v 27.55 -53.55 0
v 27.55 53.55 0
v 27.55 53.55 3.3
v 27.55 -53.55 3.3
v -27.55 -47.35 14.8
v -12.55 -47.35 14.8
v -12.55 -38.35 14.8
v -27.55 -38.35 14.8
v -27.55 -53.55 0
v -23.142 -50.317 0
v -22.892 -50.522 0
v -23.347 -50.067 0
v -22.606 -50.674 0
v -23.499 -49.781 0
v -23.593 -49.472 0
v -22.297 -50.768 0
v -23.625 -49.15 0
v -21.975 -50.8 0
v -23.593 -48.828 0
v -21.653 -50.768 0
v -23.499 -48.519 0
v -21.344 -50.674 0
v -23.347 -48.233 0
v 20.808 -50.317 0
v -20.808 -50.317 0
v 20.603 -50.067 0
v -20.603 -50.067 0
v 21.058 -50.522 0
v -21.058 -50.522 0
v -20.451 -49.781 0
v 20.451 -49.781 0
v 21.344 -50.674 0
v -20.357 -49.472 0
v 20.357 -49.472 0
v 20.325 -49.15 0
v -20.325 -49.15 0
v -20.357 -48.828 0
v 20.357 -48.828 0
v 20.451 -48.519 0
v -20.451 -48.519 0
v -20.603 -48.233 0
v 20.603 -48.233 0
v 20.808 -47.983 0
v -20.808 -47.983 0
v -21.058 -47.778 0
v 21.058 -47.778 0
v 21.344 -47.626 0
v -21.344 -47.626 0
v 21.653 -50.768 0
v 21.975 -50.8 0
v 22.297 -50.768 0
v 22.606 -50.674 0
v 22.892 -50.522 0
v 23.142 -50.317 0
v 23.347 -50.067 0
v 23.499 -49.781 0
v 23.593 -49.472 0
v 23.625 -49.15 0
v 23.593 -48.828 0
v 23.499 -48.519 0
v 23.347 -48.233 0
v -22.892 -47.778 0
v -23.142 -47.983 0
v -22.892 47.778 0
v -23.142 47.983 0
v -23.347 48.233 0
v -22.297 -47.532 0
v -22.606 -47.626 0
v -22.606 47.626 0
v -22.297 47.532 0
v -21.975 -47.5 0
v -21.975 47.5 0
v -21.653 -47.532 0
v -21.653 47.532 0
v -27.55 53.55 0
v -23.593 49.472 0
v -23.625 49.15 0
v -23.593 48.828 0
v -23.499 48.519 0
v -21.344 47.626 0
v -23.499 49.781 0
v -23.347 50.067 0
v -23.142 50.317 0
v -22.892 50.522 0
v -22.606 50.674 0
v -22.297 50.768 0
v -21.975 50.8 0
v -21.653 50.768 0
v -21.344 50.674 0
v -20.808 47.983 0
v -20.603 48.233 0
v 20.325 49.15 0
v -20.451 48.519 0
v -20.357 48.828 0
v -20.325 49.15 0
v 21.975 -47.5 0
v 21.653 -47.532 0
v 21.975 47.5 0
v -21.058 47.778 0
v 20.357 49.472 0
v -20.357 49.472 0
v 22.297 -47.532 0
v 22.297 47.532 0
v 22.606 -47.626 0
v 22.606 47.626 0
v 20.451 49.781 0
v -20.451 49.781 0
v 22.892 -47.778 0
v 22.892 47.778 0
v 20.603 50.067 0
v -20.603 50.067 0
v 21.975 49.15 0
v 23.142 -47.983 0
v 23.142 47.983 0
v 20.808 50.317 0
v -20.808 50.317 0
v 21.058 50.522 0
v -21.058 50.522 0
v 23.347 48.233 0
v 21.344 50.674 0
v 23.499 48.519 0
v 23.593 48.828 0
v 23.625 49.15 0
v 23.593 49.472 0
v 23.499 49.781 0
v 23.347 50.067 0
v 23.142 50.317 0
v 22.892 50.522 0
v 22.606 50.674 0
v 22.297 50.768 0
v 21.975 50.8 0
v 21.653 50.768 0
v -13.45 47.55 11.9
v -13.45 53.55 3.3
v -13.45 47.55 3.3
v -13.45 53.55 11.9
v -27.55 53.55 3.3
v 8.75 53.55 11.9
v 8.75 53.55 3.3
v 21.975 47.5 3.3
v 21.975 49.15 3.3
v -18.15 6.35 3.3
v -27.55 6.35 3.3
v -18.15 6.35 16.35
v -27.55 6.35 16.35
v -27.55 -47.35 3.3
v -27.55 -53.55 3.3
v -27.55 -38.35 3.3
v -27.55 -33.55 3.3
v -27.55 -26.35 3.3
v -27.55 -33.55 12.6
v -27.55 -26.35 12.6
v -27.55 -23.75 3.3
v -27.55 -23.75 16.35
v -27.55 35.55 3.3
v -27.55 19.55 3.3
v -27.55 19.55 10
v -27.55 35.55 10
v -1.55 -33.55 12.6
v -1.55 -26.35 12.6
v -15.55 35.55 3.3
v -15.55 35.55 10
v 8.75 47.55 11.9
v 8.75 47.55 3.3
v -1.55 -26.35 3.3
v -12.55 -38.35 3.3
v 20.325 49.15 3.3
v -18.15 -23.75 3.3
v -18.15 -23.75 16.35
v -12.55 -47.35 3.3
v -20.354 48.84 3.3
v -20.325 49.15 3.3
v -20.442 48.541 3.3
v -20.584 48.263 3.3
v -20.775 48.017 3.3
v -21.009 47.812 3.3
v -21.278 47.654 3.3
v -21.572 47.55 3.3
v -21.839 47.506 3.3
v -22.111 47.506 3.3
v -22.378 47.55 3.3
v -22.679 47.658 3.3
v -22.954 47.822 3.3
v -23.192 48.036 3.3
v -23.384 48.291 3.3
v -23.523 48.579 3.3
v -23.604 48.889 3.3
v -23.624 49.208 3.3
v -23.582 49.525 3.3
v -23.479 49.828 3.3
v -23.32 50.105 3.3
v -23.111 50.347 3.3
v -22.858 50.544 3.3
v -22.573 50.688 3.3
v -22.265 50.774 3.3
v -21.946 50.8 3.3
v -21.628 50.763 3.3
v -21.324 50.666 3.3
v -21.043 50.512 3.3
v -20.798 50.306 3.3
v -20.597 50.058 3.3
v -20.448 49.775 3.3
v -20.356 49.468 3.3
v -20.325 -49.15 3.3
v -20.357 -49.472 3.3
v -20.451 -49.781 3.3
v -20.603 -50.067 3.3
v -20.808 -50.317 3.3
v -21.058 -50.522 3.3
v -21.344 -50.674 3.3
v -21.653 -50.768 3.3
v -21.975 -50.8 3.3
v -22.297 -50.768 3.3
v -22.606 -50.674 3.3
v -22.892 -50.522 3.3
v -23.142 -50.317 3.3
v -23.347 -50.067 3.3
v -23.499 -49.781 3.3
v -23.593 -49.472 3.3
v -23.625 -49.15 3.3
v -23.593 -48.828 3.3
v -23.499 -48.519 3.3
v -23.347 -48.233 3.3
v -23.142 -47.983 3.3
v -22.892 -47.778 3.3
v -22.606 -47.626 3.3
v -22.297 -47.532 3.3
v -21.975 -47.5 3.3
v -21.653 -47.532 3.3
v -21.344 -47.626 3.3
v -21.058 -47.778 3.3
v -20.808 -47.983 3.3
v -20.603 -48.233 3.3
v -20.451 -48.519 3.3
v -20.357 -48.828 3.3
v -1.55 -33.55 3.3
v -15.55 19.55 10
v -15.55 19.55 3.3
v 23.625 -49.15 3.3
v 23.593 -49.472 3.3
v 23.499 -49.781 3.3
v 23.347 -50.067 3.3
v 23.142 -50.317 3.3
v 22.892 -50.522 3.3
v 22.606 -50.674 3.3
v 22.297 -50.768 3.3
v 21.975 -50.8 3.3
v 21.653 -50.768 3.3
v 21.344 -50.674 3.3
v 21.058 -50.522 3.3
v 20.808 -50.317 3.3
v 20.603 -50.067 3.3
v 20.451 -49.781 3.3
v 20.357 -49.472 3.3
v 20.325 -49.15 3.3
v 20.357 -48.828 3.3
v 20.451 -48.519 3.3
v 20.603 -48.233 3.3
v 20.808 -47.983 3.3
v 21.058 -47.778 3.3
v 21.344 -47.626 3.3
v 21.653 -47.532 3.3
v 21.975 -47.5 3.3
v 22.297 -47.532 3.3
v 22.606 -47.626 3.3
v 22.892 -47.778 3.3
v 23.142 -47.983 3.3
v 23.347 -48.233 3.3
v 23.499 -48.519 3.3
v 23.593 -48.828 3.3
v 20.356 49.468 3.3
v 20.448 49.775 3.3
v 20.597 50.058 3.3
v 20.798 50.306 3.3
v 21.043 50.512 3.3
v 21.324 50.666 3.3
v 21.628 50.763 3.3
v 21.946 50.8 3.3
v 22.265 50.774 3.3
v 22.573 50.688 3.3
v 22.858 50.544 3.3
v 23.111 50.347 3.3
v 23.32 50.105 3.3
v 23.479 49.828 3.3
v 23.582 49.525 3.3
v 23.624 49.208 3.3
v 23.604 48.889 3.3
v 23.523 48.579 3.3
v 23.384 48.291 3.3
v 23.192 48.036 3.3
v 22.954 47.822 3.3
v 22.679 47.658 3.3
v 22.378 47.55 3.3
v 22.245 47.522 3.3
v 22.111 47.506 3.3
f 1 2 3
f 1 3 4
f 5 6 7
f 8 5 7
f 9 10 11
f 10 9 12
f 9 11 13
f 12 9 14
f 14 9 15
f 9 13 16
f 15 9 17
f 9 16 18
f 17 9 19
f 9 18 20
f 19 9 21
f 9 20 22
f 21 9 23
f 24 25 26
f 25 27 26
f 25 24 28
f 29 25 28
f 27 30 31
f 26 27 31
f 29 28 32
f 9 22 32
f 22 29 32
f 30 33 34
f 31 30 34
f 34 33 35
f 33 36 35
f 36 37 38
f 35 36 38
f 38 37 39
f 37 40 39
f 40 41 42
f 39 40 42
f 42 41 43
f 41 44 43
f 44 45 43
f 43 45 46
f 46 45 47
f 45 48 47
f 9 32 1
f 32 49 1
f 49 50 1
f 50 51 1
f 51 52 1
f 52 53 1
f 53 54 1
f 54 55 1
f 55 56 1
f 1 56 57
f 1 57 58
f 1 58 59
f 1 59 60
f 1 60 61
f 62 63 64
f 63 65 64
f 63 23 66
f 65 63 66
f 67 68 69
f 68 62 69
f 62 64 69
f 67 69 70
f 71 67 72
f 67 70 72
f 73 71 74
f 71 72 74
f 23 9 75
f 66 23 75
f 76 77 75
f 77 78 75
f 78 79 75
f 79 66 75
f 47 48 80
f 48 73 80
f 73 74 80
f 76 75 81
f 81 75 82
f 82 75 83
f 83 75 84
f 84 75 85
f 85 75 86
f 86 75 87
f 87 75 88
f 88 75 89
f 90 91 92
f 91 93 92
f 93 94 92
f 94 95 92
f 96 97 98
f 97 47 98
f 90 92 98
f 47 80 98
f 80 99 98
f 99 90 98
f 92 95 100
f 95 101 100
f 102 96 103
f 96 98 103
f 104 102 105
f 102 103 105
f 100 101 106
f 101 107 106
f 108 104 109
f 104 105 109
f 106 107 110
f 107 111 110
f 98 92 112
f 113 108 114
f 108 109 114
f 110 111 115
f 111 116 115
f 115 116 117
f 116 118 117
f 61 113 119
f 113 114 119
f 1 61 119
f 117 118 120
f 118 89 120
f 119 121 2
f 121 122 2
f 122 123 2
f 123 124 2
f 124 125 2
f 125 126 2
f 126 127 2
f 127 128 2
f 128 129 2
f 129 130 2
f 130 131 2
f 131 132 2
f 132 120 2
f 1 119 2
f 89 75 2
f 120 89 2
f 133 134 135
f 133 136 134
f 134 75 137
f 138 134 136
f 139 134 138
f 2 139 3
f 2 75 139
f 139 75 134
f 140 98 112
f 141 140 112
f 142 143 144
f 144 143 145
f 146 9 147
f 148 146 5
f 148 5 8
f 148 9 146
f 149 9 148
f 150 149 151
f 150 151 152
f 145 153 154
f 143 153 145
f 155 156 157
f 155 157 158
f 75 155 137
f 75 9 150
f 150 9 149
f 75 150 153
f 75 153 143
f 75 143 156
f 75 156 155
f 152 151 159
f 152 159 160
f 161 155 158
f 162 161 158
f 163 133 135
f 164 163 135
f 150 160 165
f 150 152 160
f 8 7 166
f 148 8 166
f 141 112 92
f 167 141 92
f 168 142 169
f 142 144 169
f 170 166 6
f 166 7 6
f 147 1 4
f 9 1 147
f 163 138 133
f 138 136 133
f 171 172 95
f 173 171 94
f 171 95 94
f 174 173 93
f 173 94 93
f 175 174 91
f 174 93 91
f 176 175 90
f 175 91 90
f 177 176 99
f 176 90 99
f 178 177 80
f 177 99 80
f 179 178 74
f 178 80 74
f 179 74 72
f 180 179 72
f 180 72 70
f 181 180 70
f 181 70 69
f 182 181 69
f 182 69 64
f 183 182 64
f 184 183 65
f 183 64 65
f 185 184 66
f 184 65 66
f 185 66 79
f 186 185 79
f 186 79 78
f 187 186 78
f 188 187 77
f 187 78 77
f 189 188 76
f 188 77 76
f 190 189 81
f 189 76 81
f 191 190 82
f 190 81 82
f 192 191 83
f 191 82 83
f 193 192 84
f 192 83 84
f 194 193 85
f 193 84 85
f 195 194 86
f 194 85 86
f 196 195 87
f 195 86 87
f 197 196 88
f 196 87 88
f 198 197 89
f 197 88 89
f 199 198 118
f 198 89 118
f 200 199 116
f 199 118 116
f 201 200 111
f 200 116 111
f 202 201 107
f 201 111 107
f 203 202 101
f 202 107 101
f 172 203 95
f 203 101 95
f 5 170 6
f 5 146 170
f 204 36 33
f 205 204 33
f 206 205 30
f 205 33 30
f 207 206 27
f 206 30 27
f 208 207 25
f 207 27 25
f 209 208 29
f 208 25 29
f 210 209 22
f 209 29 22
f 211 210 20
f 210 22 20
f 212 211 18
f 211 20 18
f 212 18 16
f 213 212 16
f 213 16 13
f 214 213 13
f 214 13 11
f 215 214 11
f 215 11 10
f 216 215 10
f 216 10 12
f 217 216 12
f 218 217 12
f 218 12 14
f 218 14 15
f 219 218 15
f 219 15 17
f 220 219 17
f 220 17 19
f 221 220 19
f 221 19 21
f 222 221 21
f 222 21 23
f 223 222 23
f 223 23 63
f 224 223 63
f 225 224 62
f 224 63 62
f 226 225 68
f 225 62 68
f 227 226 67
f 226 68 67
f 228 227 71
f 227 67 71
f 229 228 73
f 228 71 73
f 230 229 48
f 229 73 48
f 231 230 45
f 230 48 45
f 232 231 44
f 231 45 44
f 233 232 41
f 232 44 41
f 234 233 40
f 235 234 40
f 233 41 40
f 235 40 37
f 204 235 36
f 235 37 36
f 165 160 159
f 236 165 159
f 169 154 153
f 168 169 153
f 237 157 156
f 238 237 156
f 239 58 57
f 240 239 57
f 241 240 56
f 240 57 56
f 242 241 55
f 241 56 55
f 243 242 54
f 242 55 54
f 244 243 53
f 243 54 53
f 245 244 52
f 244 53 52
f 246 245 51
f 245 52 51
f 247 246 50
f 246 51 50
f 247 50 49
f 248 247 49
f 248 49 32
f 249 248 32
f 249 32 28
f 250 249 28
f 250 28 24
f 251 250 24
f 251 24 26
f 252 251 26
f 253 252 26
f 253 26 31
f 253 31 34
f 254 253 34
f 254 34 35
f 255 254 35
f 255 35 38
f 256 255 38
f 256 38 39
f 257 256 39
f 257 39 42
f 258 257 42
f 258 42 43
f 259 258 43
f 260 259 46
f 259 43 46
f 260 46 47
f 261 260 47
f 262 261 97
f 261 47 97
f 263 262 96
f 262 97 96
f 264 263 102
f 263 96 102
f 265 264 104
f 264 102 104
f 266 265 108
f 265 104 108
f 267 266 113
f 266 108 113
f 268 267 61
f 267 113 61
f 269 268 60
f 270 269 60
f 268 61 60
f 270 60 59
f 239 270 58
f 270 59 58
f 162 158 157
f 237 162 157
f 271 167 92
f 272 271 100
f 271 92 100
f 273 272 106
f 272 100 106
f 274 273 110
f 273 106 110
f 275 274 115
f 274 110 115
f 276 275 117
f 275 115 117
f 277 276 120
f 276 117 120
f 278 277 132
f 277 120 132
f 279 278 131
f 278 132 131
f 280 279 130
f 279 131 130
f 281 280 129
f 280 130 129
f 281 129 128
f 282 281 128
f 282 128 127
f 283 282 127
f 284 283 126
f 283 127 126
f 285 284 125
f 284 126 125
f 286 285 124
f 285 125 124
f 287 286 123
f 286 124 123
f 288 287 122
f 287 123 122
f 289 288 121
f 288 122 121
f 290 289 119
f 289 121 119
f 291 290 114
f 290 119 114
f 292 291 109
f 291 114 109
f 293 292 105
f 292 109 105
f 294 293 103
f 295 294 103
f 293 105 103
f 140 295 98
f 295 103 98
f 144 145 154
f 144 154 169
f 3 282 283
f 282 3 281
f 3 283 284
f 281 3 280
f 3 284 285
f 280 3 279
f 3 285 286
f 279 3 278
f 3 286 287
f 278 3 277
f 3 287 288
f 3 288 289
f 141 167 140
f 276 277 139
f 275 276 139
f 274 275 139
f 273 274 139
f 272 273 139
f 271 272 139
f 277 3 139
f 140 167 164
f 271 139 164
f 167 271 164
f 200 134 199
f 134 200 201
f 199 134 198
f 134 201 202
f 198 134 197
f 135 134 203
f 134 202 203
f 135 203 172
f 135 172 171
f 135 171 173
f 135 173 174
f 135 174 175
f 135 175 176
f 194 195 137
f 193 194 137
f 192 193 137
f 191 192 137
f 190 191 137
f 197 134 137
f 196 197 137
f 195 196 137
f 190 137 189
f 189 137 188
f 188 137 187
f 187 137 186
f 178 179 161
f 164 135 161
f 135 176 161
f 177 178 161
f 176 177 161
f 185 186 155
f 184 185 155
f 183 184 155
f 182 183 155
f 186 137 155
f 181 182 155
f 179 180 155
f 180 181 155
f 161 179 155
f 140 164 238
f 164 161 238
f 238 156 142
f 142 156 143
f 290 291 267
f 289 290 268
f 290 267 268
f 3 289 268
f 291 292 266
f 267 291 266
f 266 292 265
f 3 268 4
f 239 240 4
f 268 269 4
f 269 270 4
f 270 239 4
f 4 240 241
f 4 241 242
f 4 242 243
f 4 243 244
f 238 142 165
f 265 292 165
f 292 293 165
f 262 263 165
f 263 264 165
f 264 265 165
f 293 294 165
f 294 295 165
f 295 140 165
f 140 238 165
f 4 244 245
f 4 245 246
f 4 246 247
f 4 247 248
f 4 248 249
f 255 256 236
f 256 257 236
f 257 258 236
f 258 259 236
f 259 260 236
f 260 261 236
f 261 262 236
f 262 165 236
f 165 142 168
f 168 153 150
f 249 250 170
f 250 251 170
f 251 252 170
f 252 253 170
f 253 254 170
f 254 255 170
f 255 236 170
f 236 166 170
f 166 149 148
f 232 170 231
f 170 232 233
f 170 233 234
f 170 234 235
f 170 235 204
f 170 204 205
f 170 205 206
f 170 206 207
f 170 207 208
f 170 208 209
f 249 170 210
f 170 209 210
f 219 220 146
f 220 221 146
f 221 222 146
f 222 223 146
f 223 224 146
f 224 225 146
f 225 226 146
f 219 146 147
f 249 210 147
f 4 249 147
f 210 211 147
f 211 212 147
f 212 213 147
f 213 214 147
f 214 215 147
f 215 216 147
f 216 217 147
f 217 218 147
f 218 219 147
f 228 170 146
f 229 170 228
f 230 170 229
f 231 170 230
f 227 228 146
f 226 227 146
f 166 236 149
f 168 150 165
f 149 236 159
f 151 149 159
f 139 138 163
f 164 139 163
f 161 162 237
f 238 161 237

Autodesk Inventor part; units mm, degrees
ref_plane "YZ Plane" through (0, 0, 0) normal (1, 0, 0) x (0, 1, 0)
ref_plane "XZ Plane" through (0, 0, 0) normal (0, 1, 0) x (-1, 0, 0)
ref_plane "XY Plane" through (0, 0, 0) normal (0, 0, 1) x (1, 0, 0)
sketch "Boceto1" plane through (0, 0, 0) normal (0, 0, 1) x (1, 0, 0)
  line L0 (27.55, -53.55) -> (-27.55, -53.55)
  line L1 (-27.55, -53.55) -> (-27.55, 53.55)
  line L2 (-27.55, 53.55) -> (27.55, 53.55)
  line L3 (27.55, 53.55) -> (27.55, -53.55)
  line L4 (27.55, -53.55) -> (-27.55, 53.55) construction
  line L5 (-27.55, -53.55) -> (27.55, 53.55) construction
  line L6 (20.325, -47.5) -> (-20.325, -47.5)
  line L7 (-20.325, -47.5) -> (-20.325, 47.5)
  line L8 (-20.325, 47.5) -> (20.325, 47.5)
  line L9 (20.325, 47.5) -> (20.325, -47.5)
  line L10 (20.325, -47.5) -> (-20.325, 47.5) construction
  line L11 (-20.325, -47.5) -> (20.325, 47.5) construction
  line L12 (-20.325, 47.5) -> (-21.975, 47.5)
  line L13 (-21.975, 47.5) -> (-21.975, 49.15)
  line L14 (-21.975, 49.15) -> (-21.975, -49.15)
  line L15 (-21.975, -49.15) -> (21.975, -49.15)
  line L16 (21.975, -49.15) -> (21.975, 49.15)
  line L17 (21.975, 49.15) -> (-21.975, 49.15)
  circle A0 centre (-21.975, 49.15) radius 1.65
  circle A1 centre (21.975, 49.15) radius 1.65
  circle A2 centre (21.975, -49.15) radius 1.65
  circle A3 centre (-21.975, -49.15) radius 1.65
  point P0 (0, 0)
  point P1 (20.325, 49.15)
  point P2 (21.975, 47.5)
  dimension "d0" = 55.1
  dimension "d1" = 107.1
  dimension "d2" = 40.65
  dimension "d3" = 95
  dimension "d4" = 1.65
  dimension "d5" = 1.65
  dimension "d6" = 1.65
  dimension "d7" = 3.3
  dimension "d8" = 3.3
  dimension "d9" = 3.3
extrude "Extrusión1" add sketch "Boceto1" along normal blind 16.35 contours L0 L1 L2 L3 | A0 L17 A1 L16 A2 L15 A3 L14 | L6 L7 L8 L9 | L17 L16 A1 picked at (20.8888, 49.0276)
sketch "Boceto2" plane through (-27.55, -53.55, 0) normal (-1, 0, 0) x (0, 0, 1)
  line L0 (0, 107.1) -> (0, 88.8)
  line L1 (0, 107.1) -> (0, 0) projected
  line L2 (0, 107.1) -> (3.3, 107.1)
  line L3 (3.3, 107.1) -> (3.3, 53.55)
  line L4 (3.3, 53.55) -> (3.3, 0)
  line L5 (0, 0) -> (16.35, 0) projected
  line L6 (3.3, 107.1) -> (11.9, 107.1)
  line L7 (0, 107.1) -> (16.35, 107.1) projected
  line L8 (11.9, 107.1) -> (11.9, 101.1)
  line L9 (11.9, 101.1) -> (3.3, 101.1)
  line L10 (3.3, 107.1) -> (3.3, 89.1)
  line L11 (0, 102.7) -> (16.35, 102.7) projected
  line L12 (3.3, 107.1) -> (21.3, 107.1) construction
  line L13 (3.3, 89.1) -> (10, 89.1)
  line L14 (10, 89.1) -> (10, 73.1)
  line L15 (10, 73.1) -> (3.3, 73.1)
  line L16 (3.3, 107.1) -> (3.3, 59.9)
  line L17 (3.3, 59.9) -> (16.3, 59.9)
  line L18 (16.3, 59.9) -> (16.35, 59.9)
  line L19 (16.35, 107.1) -> (16.35, 0) projected
  line L20 (16.35, 59.9) -> (16.35, 29.8)
  line L21 (16.35, 59.9) -> (46.45, 59.9) construction
  line L22 (16.35, 29.8) -> (3.3, 29.8)
  line L23 (3.3, 0) -> (3.3, 6.2)
  line L24 (3.3, 6.2) -> (14.8, 6.2)
  line L25 (16.35, 6.05) -> (0, 6.05) projected
  line L26 (3.3, 6.2) -> (14.8, 6.2) construction
  line L27 (14.8, 6.2) -> (14.8, 15.2)
  line L28 (14.8, 6.2) -> (23.8, 6.2) construction
  line L29 (14.8, 15.2) -> (3.3, 15.2)
  line L30 (3.3, 0) -> (3.3, 20)
  line L31 (3.3, 0) -> (23.3, 0) construction
  line L32 (3.3, 20) -> (12.6, 20)
  line L33 (12.6, 20) -> (12.6, 27.2)
  line L34 (12.6, 27.2) -> (3.3, 27.2)
  point P0 (0, 53.55)
  dimension "d17" = 3.3
  dimension "d18" = 8.6
  dimension "d19" = 6
  dimension "d20" = 18
  dimension "d21" = 90
  dimension "d22" = 6.7
  dimension "d23" = 16
  dimension "d24" = 47.2
  dimension "d25" = 13
  dimension "d26" = 90
  dimension "d27" = 30.1
  dimension "d28" = 90
  dimension "d29" = 6.2
  dimension "d30" = 11.5
  dimension "d31" = 0
  dimension "d32" = 9
  dimension "d33" = 90
  dimension "d34" = 20
  dimension "d35" = 90
  dimension "d36" = 9.3
  dimension "d37" = 90
  dimension "d38" = 7.2
  dimension "d39" = 90
extrude "Extrusión2" cut sketch "Boceto2" against normal through all contours L7 L19 L11 L8 | L9 L8 L11 L19 L18 L17 L3 L15 L14 L13 | L25 L19 L5 L4 | L4 L24 L27 L29 L32 L33 L34 L22 L19 L25
sketch "Boceto3" plane through (0, 0, 16.35) normal (0, 0, 1) x (1, 0, 0)
  line L0 (-27.55, 53.55) -> (27.55, 53.55) projected
  line L1 (27.55, 47.55) -> (27.55, 35.55) projected
  line L2 (27.55, 53.55) -> (27.55, 47.55) projected
  line L3 (27.55, 35.55) -> (27.55, 19.55) projected
  line L4 (27.55, 19.55) -> (27.55, 6.35) projected
  line L5 (27.55, -23.75) -> (27.55, 6.35) projected
  line L6 (27.55, -26.35) -> (27.55, -33.55) projected
  line L7 (-27.55, 53.55) -> (-27.55, -53.55) projected
  line L8 (27.55, 53.55) -> (-27.55, 53.55) projected
  line L9 (-27.55, -53.55) -> (27.55, -53.55) projected
  line L10 (27.55, -53.55) -> (27.55, 53.55) projected
  line L11 (-27.55, 53.55) -> (-13.45, 53.55)
  line L12 (-21.5719, 47.55) -> (21.975, 47.55) projected
  line L13 (-27.55, 35.55) -> (27.55, 35.55) projected
  line L14 (-27.55, 19.55) -> (27.55, 19.55) projected
  line L15 (-27.55, 6.35) -> (27.55, 6.35) projected
  line L16 (-27.55, -23.75) -> (27.55, -23.75) projected
  line L17 (-27.55, -26.35) -> (27.55, -26.35) projected
  line L18 (-27.55, -33.55) -> (27.55, -33.55) projected
  line L19 (-27.55, -38.35) -> (27.55, -38.35) projected
  line L20 (27.55, -38.35) -> (27.55, -47.35) projected
  line L21 (-27.55, -38.35) -> (27.55, -38.35) projected
  line L22 (-27.55, -47.35) -> (-27.55, -38.35) projected
  line L23 (-27.55, -47.35) -> (27.55, -47.35) projected
  line L24 (27.55, -47.35) -> (27.55, -53.55) projected
  line L25 (-27.55, -47.35) -> (27.55, -47.35) projected
  line L26 (-27.55, -53.55) -> (-27.55, -47.35) projected
  line L27 (27.55, -53.55) -> (-27.55, -53.55) projected
  circle A0 centre (-21.975, -49.15) radius 1.65 projected
  circle A1 centre (21.975, -49.15) radius 1.65 projected
  line L28 (27.55, 53.55) -> (-27.55, 53.55) projected
  line L29 (27.55, 53.55) -> (27.55, 47.55) projected
  line L30 (-27.55, 53.55) -> (27.55, 53.55) projected
  line L31 (-27.55, 47.55) -> (-27.55, 53.55) projected
  line L32 (-27.55, 47.55) -> (-22.3781, 47.55) projected
  arc A2 (-21.5719, 47.55) -> (-22.3781, 47.55) centre (-21.975, 49.15) ccw projected
  line L33 (-21.5719, 47.55) -> (21.975, 47.55) projected
  line L34 (21.975, 49.15) -> (21.975, 47.55) projected
  line L35 (20.325, 49.15) -> (21.975, 49.15) projected
  arc A3 (22.3781, 47.55) -> (20.325, 49.15) centre (21.975, 49.15) ccw projected
  line L36 (22.3781, 47.55) -> (27.55, 47.55) projected
  line L37 (-13.45, 53.55) -> (-13.45, 47.55)
  line L38 (27.55, 53.55) -> (8.75, 53.55)
  line L39 (8.75, 53.55) -> (8.75, 47.55)
  line L40 (-21.5719, 47.55) -> (21.975, 47.55) projected
  line L41 (-27.55, 35.55) -> (-27.55, 47.55) projected
  line L42 (-27.55, 35.55) -> (-15.55, 35.55)
  line L43 (-15.55, 35.55) -> (-15.55, 19.55)
  line L44 (27.55, 6.35) -> (-27.55, 6.35) projected
  line L45 (-27.55, 6.35) -> (-18.15, 6.35)
  line L46 (-18.15, 6.35) -> (-18.15, -26.35)
  line L47 (-27.55, -26.35) -> (-1.55, -26.35)
  line L48 (-1.55, -26.35) -> (-1.55, -33.55)
  line L49 (-27.55, -38.35) -> (-12.55, -38.35)
  line L50 (-12.55, -38.35) -> (-12.55, -47.35)
  point P0 (0, 0)
  point P1 (-18.15, -23.75)
  point P2 (21.975, 47.55)
  dimension "d42" = 14.1
  dimension "d43" = 18.8
  dimension "d44" = 12
  dimension "d45" = 9.4
  dimension "d46" = 26
  dimension "d47" = 15
extrude "Extrusión3" cut sketch "Boceto3" against normal up to surface (13.05 mm away) contours L0 L37 L12 A2 L32 L7 | L0 L2 L36 A3 L35 L34 L12 L39 | L13 L3 L14 L43 | L15 L5 L16 L46 | L48 L17 L6 L18 | L19 L10 L23 L50
properties part number "placa"
